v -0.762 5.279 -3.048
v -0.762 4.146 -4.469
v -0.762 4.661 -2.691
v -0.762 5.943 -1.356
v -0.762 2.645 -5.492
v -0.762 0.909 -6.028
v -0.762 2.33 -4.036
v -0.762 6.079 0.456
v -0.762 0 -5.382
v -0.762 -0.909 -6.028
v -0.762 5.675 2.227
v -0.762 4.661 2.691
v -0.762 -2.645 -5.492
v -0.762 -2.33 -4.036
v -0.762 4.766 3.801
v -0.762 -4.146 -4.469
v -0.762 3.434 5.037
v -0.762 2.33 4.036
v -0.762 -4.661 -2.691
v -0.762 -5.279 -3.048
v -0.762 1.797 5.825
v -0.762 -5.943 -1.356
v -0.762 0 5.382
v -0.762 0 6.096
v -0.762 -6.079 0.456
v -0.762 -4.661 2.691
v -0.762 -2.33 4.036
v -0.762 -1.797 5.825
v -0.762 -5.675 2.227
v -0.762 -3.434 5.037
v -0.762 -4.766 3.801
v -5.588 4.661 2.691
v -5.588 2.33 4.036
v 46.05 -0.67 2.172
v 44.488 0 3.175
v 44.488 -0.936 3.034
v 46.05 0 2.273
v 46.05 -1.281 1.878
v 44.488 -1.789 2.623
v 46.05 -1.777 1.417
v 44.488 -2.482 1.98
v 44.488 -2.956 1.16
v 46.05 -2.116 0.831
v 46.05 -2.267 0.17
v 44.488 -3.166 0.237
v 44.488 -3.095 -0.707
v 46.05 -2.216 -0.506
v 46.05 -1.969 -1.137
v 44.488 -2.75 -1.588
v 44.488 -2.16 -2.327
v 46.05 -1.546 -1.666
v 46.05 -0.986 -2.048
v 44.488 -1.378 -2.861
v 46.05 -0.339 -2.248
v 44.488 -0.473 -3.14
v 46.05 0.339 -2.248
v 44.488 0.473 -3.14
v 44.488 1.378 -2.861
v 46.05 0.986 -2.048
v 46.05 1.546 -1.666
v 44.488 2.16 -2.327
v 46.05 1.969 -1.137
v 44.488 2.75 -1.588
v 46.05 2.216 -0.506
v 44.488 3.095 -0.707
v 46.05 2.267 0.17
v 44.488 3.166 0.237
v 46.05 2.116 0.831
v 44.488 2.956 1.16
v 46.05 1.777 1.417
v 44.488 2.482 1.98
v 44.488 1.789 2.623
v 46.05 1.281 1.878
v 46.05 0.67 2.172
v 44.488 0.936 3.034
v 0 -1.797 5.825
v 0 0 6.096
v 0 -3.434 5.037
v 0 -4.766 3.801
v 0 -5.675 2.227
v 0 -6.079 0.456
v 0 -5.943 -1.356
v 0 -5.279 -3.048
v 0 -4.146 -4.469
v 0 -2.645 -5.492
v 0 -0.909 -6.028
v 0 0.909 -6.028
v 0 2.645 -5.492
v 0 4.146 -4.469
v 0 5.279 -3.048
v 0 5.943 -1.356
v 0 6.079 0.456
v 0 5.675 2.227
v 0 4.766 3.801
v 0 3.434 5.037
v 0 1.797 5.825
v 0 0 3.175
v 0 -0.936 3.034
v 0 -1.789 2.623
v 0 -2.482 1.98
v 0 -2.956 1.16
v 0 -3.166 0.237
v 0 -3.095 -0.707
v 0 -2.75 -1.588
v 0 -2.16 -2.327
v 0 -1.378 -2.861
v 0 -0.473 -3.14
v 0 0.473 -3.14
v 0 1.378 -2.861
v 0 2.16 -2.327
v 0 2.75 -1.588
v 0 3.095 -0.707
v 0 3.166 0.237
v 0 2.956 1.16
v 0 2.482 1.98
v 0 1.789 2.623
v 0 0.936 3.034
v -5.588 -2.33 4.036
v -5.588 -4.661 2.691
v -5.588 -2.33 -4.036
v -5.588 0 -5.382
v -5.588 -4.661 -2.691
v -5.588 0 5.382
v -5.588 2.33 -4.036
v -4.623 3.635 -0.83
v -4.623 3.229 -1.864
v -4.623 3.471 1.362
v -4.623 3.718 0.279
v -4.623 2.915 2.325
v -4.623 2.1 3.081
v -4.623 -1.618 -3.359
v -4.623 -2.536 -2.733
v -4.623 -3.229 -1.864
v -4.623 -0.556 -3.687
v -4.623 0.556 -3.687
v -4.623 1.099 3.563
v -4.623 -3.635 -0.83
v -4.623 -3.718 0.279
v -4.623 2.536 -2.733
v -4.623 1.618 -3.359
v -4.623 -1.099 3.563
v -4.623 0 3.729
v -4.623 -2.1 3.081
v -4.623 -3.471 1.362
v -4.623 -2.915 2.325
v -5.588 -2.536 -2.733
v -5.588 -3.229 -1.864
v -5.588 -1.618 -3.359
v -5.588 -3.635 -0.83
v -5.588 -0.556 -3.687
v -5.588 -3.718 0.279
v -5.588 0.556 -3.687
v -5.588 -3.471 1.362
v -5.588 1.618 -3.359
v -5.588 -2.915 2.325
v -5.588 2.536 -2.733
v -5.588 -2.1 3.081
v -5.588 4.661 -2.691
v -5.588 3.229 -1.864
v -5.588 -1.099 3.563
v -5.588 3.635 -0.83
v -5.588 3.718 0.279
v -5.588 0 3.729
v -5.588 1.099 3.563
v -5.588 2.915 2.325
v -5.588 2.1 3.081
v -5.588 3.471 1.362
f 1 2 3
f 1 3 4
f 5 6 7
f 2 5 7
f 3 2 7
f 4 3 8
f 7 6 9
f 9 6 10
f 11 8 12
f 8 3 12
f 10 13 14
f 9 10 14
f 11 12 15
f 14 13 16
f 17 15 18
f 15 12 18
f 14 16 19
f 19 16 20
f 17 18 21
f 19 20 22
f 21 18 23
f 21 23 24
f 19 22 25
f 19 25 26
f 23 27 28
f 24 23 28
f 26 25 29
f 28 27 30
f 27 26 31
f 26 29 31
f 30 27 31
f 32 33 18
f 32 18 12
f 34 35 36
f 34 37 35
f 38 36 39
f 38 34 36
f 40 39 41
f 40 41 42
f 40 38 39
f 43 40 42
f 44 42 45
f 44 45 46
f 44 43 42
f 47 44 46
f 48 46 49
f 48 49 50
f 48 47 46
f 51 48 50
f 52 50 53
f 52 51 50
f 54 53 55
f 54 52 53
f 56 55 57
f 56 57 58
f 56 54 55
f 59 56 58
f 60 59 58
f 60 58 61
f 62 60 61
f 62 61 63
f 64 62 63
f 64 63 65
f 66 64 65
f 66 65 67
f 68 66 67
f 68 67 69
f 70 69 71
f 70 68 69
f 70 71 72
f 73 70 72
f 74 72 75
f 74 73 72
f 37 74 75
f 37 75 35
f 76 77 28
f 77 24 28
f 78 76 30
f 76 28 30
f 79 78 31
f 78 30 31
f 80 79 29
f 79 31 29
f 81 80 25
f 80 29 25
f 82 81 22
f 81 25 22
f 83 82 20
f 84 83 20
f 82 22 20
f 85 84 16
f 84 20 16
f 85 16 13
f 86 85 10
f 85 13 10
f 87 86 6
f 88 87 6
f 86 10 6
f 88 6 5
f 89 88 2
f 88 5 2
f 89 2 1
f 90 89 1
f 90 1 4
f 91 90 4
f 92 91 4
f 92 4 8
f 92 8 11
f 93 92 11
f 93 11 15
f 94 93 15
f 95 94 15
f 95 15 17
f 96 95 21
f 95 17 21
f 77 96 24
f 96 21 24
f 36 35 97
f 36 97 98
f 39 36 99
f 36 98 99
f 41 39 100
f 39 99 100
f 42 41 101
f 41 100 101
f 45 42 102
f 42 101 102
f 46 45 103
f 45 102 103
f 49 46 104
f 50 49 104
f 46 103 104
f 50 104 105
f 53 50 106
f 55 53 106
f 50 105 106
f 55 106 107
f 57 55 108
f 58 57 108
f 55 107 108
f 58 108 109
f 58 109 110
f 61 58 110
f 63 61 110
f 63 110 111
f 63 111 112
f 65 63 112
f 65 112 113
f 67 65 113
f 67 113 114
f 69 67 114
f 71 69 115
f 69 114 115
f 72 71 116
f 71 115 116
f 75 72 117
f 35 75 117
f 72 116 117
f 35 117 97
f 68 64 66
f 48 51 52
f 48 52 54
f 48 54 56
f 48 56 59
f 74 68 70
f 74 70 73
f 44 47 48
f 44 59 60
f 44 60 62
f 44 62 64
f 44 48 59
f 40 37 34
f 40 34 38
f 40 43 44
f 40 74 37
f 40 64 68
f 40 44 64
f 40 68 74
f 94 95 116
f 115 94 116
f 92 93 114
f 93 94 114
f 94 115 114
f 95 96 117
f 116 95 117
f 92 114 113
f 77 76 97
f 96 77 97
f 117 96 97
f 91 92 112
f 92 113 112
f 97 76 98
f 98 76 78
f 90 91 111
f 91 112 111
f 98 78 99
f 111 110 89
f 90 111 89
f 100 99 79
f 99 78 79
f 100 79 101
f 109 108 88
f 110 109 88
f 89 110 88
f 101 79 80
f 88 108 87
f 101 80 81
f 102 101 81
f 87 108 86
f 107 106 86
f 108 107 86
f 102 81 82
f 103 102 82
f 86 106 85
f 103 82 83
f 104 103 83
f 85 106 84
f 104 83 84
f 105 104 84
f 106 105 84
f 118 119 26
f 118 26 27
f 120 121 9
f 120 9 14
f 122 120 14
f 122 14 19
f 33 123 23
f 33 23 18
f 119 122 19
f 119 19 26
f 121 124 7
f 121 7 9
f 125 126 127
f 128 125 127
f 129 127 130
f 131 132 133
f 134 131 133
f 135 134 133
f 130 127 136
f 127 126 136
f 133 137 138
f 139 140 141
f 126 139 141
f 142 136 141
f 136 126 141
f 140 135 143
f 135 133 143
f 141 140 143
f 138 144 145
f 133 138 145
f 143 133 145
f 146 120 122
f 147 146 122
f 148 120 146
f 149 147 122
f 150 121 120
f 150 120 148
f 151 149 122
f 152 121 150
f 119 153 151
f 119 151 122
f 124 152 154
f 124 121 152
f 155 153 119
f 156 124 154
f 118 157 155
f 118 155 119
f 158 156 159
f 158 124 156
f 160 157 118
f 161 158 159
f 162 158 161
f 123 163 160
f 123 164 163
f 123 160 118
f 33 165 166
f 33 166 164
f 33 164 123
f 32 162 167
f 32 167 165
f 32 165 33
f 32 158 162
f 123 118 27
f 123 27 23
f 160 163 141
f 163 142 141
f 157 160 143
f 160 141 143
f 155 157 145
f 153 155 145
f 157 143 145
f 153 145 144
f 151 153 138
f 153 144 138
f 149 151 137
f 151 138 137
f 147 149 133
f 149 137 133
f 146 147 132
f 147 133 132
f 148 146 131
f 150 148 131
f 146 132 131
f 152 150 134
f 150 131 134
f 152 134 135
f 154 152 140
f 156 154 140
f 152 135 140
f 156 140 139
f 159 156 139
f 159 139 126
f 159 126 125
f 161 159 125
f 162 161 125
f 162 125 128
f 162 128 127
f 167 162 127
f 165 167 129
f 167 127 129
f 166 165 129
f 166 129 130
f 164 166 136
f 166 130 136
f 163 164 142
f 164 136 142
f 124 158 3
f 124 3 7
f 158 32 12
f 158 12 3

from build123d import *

# Parameters (mm, degrees)
EXTRUDE1_REACH = 54.353


with BuildPart() as part:
    # Sketch1 → base-Revolve (revolve)
    with BuildSketch(Plane.XY, mode=Mode.PRIVATE) as base_revolve_sk:
        Polygon((0, 6.096), (-0.762, 6.096), (-0.762, 4.6609), (-5.588, 4.6609), (-5.588, 3.72872), (-4.6228, 3.72872), (-4.6228, 0), (0, 0), (46.0502, 0), (46.0502, 3.175), (0, 3.175), align=None)
    revolve(base_revolve_sk.sketch.rotate(Axis((0, 0, 0), (1, 0, 0)), 90), axis=Axis((0, 0, 0), (1, 0, 0)))

    # Sketch15 → Extrude1 (add, up to next)
    with BuildSketch(Plane.ZY.offset(5.588), mode=Mode.PRIVATE) as extrude1_sk1:
        with BuildLine():
            ThreePointArc((-4.036457824, -2.330449967), (-4.6609, 3.6e-08), (-4.036457787, 2.33045003))
            Line((-4.036457787, 2.33045003), (-5.381943739, 0))
            Line((-5.381943739, 0), (-4.036457824, -2.330449967))
        make_face()
    extrude1_tool1 = extrude(extrude1_sk1.sketch, amount=-EXTRUDE1_REACH, mode=Mode.PRIVATE) - part.part
    # Sketch15 → Extrude1 (add, up to next)
    with BuildSketch(Plane.ZY.offset(5.588), mode=Mode.PRIVATE) as extrude1_sk2:
        with BuildLine():
            ThreePointArc((-4.036457787, 2.33045003), (-2.330449985, 4.036457813), (0, 4.6609))
            Line((0, 4.6609), (-2.69097187, 4.6609))
            Line((-2.69097187, 4.6609), (-4.036457787, 2.33045003))
        make_face()
    extrude1_tool2 = extrude(extrude1_sk2.sketch, amount=-EXTRUDE1_REACH, mode=Mode.PRIVATE) - part.part
    # Sketch15 → Extrude1 (add, up to next)
    with BuildSketch(Plane.ZY.offset(5.588), mode=Mode.PRIVATE) as extrude1_sk3:
        with BuildLine():
            ThreePointArc((0, 4.6609), (2.330450001, 4.036457804), (4.036457805, 2.330449998))
            Line((4.036457805, 2.330449998), (2.69097187, 4.6609))
            Line((2.69097187, 4.6609), (0, 4.6609))
        make_face()
    extrude1_tool3 = extrude(extrude1_sk3.sketch, amount=-EXTRUDE1_REACH, mode=Mode.PRIVATE) - part.part
    # Sketch15 → Extrude1 (add, up to next)
    with BuildSketch(Plane.ZY.offset(5.588), mode=Mode.PRIVATE) as extrude1_sk4:
        with BuildLine():
            Line((4.036457776, -2.330450049), (5.381943739, 0))
            Line((5.381943739, 0), (4.036457805, 2.330449998))
            ThreePointArc((4.036457805, 2.330449998), (4.502083684, 1.206329686), (4.6609, 0))
            ThreePointArc((4.6609, 0), (4.502083676, -1.206329715), (4.036457776, -2.330450049))
        make_face()
    extrude1_tool4 = extrude(extrude1_sk4.sketch, amount=-EXTRUDE1_REACH, mode=Mode.PRIVATE) - part.part
    # Sketch15 → Extrude1 (add, up to next)
    with BuildSketch(Plane.ZY.offset(5.588), mode=Mode.PRIVATE) as extrude1_sk5:
        with BuildLine():
            Line((2.69097187, -4.6609), (4.036457776, -2.330450049))
            ThreePointArc((4.036457776, -2.330450049), (2.330449975, -4.036457819), (0, -4.6609))
            Line((0, -4.6609), (2.69097187, -4.6609))
        make_face()
    extrude1_tool5 = extrude(extrude1_sk5.sketch, amount=-EXTRUDE1_REACH, mode=Mode.PRIVATE) - part.part
    # Sketch15 → Extrude1 (add, up to next)
    with BuildSketch(Plane.ZY.offset(5.588), mode=Mode.PRIVATE) as extrude1_sk6:
        with BuildLine():
            Line((-2.69097187, -4.6609), (0, -4.6609))
            ThreePointArc((0, -4.6609), (-2.330450017, -4.036457795), (-4.036457824, -2.330449967))
            Line((-4.036457824, -2.330449967), (-2.69097187, -4.6609))
        make_face()
    extrude1_tool6 = extrude(extrude1_sk6.sketch, amount=-EXTRUDE1_REACH, mode=Mode.PRIVATE) - part.part
    add(extrude1_tool1.solids().sort_by_distance((-5.588, 0, -4.817334))[0])
    add(extrude1_tool2.solids().sort_by_distance((-5.588, 4.171933, -2.408667))[0])
    add(extrude1_tool3.solids().sort_by_distance((-5.588, 4.171933, 2.408667))[0])
    add(extrude1_tool4.solids().sort_by_distance((-5.588, 0, 4.817334))[0])
    add(extrude1_tool5.solids().sort_by_distance((-5.588, -4.171933, 2.408667))[0])
    add(extrude1_tool6.solids().sort_by_distance((-5.588, -4.171933, -2.408667))[0])

    # Sketch8 → point_Cut-Revolve1 (revolve, cut)
    with BuildSketch(Plane.XY, mode=Mode.PRIVATE) as point_cut_revolve1_sk:
        Polygon((46.0502, 0), (46.5582, 0), (46.5582, 3.683), (44.488409787, 3.683), (44.488409787, 3.175), (46.0502, 2.2733), align=None)
    revolve(point_cut_revolve1_sk.sketch.rotate(Axis((0, 0, 0), (1, 0, 0)), 90), axis=Axis((0, 0, 0), (1, 0, 0)), mode=Mode.SUBTRACT)


solid = part.part
